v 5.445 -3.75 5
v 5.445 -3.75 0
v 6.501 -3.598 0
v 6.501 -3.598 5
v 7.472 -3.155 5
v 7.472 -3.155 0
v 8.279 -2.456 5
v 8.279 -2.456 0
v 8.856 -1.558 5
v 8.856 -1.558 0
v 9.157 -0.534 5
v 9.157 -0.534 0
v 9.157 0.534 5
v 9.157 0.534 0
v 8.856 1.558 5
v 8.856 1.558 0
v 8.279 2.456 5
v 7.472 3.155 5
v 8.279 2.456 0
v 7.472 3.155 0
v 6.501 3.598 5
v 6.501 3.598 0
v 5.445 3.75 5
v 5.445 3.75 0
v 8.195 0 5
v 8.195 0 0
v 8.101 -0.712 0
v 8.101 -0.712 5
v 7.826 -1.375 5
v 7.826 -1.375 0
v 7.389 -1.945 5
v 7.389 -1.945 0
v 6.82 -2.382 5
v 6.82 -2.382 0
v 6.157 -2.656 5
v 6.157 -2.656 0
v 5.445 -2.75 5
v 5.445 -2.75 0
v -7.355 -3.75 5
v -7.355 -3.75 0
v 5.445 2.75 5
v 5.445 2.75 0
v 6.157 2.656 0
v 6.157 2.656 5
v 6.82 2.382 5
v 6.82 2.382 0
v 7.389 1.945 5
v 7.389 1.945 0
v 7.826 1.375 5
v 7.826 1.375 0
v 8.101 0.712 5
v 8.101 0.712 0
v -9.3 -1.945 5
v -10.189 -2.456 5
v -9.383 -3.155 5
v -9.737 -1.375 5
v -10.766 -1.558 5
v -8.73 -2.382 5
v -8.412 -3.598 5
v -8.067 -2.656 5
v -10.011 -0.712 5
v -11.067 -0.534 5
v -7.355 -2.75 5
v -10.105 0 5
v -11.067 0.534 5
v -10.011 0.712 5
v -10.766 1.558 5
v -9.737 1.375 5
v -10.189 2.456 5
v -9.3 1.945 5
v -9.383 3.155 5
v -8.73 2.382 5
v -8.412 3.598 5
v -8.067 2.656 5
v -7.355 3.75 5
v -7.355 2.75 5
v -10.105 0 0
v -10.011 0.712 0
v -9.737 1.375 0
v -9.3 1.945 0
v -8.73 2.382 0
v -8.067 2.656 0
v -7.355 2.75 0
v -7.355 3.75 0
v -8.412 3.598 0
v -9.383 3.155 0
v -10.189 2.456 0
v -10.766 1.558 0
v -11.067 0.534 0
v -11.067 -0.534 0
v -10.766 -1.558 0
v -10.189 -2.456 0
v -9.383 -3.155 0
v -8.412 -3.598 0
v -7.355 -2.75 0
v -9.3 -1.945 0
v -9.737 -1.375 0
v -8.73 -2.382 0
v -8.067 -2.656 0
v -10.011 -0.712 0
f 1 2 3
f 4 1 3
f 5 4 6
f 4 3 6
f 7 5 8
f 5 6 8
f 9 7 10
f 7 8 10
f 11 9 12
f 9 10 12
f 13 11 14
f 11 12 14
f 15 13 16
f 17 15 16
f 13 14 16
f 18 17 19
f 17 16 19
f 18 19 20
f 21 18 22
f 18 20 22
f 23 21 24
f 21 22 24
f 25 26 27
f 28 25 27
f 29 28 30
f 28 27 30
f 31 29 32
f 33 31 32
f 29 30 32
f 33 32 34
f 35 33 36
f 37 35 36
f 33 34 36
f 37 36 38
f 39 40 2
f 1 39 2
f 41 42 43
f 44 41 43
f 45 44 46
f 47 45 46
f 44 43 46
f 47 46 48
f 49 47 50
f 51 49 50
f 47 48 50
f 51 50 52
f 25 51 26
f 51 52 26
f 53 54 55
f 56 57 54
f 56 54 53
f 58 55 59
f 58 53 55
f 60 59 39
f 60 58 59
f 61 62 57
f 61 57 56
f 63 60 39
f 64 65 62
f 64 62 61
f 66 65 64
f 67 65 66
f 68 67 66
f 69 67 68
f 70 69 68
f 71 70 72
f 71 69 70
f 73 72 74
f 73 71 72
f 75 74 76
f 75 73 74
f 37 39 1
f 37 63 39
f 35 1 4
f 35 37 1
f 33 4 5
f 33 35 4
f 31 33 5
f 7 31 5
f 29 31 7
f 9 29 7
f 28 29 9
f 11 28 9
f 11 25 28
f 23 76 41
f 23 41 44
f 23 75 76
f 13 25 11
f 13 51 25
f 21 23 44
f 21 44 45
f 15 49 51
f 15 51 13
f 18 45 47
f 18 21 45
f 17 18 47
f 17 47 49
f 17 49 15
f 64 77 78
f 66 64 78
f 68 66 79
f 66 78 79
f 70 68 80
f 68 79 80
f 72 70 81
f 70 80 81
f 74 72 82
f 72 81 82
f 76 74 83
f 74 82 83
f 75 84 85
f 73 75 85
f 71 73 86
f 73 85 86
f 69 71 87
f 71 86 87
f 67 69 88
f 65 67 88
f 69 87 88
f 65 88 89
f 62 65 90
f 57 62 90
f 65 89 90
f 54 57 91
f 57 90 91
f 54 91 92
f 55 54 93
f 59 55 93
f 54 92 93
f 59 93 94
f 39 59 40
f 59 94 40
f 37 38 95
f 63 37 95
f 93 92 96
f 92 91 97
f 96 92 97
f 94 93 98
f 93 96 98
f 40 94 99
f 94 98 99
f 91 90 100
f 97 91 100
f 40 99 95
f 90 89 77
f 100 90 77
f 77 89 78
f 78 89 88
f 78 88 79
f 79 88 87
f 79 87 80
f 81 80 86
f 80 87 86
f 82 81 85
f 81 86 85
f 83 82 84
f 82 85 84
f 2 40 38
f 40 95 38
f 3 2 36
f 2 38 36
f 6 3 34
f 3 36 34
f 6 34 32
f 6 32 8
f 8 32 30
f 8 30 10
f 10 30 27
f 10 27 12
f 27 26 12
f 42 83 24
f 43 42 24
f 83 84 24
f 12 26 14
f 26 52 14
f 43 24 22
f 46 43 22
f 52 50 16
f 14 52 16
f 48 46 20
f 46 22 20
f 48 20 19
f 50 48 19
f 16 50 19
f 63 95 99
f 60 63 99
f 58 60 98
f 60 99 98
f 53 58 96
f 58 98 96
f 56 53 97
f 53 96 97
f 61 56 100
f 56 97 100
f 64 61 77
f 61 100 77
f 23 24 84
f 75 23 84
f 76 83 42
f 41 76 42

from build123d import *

# Parameters (mm, degrees)
F1_DEPTH = 5


with BuildPart() as f1:
    # F0 (on Top) → F1 (new body)
    with BuildSketch(Plane.XY):
        with BuildLine():
            ThreePointArc((-10.1051355834, 0), (-9.2996792316, 1.9445436483), (-7.3551355834, 2.75))
            Line((-7.3551355834, 2.75), (-4.8056258266, 2.75))
            ThreePointArc((-4.8056258266, 2.75), (-5.9858291896, 3.4910600109), (-7.3551355834, 3.75))
            ThreePointArc((-7.3551355834, 3.75), (-11.1051355834, 0), (-7.3551355834, -3.75))
            ThreePointArc((-7.3551355834, -3.75), (-5.9858291896, -3.4910600109), (-4.8056258266, -2.75))
            Line((-4.8056258266, -2.75), (-7.3551355834, -2.75))
            ThreePointArc((-7.3551355834, -2.75), (-9.2996792316, -1.9445436483), (-10.1051355834, 0))
        make_face()
        with BuildLine():
            ThreePointArc((-7.3551355834, 3.75), (-5.9858291896, 3.4910600109), (-4.8056258266, 2.75))
            Line((-4.8056258266, 2.75), (2.8953546598, 2.75))
            ThreePointArc((2.8953546598, 2.75), (4.0755580229, 3.4910600109), (5.4448644166, 3.75))
            Line((5.4448644166, 3.75), (-7.3551355834, 3.75))
        make_face()
        with BuildLine():
            ThreePointArc((5.4448644166, 3.75), (4.0755580229, 3.4910600109), (2.8953546598, 2.75))
            Line((2.8953546598, 2.75), (5.4448644166, 2.75))
            ThreePointArc((5.4448644166, 2.75), (7.3894080649, 1.9445436483), (8.1948644166, 0))
            ThreePointArc((8.1948644166, 0), (7.3894080649, -1.9445436483), (5.4448644166, -2.75))
            Line((5.4448644166, -2.75), (2.8953546598, -2.75))
            ThreePointArc((2.8953546598, -2.75), (4.0755580229, -3.4910600109), (5.4448644166, -3.75))
            ThreePointArc((5.4448644166, -3.75), (8.0965148461, -2.6516504294), (9.1948644166, 0))
            ThreePointArc((9.1948644166, 0), (8.0965148461, 2.6516504294), (5.4448644166, 3.75))
        make_face()
        with BuildLine():
            Line((2.8953546598, -2.75), (-4.8056258266, -2.75))
            ThreePointArc((-4.8056258266, -2.75), (-5.9858291896, -3.4910600109), (-7.3551355834, -3.75))
            Line((-7.3551355834, -3.75), (5.4448644166, -3.75))
            ThreePointArc((5.4448644166, -3.75), (4.0755580229, -3.4910600109), (2.8953546598, -2.75))
        make_face()
    extrude(amount=F1_DEPTH)


solid = f1.part
